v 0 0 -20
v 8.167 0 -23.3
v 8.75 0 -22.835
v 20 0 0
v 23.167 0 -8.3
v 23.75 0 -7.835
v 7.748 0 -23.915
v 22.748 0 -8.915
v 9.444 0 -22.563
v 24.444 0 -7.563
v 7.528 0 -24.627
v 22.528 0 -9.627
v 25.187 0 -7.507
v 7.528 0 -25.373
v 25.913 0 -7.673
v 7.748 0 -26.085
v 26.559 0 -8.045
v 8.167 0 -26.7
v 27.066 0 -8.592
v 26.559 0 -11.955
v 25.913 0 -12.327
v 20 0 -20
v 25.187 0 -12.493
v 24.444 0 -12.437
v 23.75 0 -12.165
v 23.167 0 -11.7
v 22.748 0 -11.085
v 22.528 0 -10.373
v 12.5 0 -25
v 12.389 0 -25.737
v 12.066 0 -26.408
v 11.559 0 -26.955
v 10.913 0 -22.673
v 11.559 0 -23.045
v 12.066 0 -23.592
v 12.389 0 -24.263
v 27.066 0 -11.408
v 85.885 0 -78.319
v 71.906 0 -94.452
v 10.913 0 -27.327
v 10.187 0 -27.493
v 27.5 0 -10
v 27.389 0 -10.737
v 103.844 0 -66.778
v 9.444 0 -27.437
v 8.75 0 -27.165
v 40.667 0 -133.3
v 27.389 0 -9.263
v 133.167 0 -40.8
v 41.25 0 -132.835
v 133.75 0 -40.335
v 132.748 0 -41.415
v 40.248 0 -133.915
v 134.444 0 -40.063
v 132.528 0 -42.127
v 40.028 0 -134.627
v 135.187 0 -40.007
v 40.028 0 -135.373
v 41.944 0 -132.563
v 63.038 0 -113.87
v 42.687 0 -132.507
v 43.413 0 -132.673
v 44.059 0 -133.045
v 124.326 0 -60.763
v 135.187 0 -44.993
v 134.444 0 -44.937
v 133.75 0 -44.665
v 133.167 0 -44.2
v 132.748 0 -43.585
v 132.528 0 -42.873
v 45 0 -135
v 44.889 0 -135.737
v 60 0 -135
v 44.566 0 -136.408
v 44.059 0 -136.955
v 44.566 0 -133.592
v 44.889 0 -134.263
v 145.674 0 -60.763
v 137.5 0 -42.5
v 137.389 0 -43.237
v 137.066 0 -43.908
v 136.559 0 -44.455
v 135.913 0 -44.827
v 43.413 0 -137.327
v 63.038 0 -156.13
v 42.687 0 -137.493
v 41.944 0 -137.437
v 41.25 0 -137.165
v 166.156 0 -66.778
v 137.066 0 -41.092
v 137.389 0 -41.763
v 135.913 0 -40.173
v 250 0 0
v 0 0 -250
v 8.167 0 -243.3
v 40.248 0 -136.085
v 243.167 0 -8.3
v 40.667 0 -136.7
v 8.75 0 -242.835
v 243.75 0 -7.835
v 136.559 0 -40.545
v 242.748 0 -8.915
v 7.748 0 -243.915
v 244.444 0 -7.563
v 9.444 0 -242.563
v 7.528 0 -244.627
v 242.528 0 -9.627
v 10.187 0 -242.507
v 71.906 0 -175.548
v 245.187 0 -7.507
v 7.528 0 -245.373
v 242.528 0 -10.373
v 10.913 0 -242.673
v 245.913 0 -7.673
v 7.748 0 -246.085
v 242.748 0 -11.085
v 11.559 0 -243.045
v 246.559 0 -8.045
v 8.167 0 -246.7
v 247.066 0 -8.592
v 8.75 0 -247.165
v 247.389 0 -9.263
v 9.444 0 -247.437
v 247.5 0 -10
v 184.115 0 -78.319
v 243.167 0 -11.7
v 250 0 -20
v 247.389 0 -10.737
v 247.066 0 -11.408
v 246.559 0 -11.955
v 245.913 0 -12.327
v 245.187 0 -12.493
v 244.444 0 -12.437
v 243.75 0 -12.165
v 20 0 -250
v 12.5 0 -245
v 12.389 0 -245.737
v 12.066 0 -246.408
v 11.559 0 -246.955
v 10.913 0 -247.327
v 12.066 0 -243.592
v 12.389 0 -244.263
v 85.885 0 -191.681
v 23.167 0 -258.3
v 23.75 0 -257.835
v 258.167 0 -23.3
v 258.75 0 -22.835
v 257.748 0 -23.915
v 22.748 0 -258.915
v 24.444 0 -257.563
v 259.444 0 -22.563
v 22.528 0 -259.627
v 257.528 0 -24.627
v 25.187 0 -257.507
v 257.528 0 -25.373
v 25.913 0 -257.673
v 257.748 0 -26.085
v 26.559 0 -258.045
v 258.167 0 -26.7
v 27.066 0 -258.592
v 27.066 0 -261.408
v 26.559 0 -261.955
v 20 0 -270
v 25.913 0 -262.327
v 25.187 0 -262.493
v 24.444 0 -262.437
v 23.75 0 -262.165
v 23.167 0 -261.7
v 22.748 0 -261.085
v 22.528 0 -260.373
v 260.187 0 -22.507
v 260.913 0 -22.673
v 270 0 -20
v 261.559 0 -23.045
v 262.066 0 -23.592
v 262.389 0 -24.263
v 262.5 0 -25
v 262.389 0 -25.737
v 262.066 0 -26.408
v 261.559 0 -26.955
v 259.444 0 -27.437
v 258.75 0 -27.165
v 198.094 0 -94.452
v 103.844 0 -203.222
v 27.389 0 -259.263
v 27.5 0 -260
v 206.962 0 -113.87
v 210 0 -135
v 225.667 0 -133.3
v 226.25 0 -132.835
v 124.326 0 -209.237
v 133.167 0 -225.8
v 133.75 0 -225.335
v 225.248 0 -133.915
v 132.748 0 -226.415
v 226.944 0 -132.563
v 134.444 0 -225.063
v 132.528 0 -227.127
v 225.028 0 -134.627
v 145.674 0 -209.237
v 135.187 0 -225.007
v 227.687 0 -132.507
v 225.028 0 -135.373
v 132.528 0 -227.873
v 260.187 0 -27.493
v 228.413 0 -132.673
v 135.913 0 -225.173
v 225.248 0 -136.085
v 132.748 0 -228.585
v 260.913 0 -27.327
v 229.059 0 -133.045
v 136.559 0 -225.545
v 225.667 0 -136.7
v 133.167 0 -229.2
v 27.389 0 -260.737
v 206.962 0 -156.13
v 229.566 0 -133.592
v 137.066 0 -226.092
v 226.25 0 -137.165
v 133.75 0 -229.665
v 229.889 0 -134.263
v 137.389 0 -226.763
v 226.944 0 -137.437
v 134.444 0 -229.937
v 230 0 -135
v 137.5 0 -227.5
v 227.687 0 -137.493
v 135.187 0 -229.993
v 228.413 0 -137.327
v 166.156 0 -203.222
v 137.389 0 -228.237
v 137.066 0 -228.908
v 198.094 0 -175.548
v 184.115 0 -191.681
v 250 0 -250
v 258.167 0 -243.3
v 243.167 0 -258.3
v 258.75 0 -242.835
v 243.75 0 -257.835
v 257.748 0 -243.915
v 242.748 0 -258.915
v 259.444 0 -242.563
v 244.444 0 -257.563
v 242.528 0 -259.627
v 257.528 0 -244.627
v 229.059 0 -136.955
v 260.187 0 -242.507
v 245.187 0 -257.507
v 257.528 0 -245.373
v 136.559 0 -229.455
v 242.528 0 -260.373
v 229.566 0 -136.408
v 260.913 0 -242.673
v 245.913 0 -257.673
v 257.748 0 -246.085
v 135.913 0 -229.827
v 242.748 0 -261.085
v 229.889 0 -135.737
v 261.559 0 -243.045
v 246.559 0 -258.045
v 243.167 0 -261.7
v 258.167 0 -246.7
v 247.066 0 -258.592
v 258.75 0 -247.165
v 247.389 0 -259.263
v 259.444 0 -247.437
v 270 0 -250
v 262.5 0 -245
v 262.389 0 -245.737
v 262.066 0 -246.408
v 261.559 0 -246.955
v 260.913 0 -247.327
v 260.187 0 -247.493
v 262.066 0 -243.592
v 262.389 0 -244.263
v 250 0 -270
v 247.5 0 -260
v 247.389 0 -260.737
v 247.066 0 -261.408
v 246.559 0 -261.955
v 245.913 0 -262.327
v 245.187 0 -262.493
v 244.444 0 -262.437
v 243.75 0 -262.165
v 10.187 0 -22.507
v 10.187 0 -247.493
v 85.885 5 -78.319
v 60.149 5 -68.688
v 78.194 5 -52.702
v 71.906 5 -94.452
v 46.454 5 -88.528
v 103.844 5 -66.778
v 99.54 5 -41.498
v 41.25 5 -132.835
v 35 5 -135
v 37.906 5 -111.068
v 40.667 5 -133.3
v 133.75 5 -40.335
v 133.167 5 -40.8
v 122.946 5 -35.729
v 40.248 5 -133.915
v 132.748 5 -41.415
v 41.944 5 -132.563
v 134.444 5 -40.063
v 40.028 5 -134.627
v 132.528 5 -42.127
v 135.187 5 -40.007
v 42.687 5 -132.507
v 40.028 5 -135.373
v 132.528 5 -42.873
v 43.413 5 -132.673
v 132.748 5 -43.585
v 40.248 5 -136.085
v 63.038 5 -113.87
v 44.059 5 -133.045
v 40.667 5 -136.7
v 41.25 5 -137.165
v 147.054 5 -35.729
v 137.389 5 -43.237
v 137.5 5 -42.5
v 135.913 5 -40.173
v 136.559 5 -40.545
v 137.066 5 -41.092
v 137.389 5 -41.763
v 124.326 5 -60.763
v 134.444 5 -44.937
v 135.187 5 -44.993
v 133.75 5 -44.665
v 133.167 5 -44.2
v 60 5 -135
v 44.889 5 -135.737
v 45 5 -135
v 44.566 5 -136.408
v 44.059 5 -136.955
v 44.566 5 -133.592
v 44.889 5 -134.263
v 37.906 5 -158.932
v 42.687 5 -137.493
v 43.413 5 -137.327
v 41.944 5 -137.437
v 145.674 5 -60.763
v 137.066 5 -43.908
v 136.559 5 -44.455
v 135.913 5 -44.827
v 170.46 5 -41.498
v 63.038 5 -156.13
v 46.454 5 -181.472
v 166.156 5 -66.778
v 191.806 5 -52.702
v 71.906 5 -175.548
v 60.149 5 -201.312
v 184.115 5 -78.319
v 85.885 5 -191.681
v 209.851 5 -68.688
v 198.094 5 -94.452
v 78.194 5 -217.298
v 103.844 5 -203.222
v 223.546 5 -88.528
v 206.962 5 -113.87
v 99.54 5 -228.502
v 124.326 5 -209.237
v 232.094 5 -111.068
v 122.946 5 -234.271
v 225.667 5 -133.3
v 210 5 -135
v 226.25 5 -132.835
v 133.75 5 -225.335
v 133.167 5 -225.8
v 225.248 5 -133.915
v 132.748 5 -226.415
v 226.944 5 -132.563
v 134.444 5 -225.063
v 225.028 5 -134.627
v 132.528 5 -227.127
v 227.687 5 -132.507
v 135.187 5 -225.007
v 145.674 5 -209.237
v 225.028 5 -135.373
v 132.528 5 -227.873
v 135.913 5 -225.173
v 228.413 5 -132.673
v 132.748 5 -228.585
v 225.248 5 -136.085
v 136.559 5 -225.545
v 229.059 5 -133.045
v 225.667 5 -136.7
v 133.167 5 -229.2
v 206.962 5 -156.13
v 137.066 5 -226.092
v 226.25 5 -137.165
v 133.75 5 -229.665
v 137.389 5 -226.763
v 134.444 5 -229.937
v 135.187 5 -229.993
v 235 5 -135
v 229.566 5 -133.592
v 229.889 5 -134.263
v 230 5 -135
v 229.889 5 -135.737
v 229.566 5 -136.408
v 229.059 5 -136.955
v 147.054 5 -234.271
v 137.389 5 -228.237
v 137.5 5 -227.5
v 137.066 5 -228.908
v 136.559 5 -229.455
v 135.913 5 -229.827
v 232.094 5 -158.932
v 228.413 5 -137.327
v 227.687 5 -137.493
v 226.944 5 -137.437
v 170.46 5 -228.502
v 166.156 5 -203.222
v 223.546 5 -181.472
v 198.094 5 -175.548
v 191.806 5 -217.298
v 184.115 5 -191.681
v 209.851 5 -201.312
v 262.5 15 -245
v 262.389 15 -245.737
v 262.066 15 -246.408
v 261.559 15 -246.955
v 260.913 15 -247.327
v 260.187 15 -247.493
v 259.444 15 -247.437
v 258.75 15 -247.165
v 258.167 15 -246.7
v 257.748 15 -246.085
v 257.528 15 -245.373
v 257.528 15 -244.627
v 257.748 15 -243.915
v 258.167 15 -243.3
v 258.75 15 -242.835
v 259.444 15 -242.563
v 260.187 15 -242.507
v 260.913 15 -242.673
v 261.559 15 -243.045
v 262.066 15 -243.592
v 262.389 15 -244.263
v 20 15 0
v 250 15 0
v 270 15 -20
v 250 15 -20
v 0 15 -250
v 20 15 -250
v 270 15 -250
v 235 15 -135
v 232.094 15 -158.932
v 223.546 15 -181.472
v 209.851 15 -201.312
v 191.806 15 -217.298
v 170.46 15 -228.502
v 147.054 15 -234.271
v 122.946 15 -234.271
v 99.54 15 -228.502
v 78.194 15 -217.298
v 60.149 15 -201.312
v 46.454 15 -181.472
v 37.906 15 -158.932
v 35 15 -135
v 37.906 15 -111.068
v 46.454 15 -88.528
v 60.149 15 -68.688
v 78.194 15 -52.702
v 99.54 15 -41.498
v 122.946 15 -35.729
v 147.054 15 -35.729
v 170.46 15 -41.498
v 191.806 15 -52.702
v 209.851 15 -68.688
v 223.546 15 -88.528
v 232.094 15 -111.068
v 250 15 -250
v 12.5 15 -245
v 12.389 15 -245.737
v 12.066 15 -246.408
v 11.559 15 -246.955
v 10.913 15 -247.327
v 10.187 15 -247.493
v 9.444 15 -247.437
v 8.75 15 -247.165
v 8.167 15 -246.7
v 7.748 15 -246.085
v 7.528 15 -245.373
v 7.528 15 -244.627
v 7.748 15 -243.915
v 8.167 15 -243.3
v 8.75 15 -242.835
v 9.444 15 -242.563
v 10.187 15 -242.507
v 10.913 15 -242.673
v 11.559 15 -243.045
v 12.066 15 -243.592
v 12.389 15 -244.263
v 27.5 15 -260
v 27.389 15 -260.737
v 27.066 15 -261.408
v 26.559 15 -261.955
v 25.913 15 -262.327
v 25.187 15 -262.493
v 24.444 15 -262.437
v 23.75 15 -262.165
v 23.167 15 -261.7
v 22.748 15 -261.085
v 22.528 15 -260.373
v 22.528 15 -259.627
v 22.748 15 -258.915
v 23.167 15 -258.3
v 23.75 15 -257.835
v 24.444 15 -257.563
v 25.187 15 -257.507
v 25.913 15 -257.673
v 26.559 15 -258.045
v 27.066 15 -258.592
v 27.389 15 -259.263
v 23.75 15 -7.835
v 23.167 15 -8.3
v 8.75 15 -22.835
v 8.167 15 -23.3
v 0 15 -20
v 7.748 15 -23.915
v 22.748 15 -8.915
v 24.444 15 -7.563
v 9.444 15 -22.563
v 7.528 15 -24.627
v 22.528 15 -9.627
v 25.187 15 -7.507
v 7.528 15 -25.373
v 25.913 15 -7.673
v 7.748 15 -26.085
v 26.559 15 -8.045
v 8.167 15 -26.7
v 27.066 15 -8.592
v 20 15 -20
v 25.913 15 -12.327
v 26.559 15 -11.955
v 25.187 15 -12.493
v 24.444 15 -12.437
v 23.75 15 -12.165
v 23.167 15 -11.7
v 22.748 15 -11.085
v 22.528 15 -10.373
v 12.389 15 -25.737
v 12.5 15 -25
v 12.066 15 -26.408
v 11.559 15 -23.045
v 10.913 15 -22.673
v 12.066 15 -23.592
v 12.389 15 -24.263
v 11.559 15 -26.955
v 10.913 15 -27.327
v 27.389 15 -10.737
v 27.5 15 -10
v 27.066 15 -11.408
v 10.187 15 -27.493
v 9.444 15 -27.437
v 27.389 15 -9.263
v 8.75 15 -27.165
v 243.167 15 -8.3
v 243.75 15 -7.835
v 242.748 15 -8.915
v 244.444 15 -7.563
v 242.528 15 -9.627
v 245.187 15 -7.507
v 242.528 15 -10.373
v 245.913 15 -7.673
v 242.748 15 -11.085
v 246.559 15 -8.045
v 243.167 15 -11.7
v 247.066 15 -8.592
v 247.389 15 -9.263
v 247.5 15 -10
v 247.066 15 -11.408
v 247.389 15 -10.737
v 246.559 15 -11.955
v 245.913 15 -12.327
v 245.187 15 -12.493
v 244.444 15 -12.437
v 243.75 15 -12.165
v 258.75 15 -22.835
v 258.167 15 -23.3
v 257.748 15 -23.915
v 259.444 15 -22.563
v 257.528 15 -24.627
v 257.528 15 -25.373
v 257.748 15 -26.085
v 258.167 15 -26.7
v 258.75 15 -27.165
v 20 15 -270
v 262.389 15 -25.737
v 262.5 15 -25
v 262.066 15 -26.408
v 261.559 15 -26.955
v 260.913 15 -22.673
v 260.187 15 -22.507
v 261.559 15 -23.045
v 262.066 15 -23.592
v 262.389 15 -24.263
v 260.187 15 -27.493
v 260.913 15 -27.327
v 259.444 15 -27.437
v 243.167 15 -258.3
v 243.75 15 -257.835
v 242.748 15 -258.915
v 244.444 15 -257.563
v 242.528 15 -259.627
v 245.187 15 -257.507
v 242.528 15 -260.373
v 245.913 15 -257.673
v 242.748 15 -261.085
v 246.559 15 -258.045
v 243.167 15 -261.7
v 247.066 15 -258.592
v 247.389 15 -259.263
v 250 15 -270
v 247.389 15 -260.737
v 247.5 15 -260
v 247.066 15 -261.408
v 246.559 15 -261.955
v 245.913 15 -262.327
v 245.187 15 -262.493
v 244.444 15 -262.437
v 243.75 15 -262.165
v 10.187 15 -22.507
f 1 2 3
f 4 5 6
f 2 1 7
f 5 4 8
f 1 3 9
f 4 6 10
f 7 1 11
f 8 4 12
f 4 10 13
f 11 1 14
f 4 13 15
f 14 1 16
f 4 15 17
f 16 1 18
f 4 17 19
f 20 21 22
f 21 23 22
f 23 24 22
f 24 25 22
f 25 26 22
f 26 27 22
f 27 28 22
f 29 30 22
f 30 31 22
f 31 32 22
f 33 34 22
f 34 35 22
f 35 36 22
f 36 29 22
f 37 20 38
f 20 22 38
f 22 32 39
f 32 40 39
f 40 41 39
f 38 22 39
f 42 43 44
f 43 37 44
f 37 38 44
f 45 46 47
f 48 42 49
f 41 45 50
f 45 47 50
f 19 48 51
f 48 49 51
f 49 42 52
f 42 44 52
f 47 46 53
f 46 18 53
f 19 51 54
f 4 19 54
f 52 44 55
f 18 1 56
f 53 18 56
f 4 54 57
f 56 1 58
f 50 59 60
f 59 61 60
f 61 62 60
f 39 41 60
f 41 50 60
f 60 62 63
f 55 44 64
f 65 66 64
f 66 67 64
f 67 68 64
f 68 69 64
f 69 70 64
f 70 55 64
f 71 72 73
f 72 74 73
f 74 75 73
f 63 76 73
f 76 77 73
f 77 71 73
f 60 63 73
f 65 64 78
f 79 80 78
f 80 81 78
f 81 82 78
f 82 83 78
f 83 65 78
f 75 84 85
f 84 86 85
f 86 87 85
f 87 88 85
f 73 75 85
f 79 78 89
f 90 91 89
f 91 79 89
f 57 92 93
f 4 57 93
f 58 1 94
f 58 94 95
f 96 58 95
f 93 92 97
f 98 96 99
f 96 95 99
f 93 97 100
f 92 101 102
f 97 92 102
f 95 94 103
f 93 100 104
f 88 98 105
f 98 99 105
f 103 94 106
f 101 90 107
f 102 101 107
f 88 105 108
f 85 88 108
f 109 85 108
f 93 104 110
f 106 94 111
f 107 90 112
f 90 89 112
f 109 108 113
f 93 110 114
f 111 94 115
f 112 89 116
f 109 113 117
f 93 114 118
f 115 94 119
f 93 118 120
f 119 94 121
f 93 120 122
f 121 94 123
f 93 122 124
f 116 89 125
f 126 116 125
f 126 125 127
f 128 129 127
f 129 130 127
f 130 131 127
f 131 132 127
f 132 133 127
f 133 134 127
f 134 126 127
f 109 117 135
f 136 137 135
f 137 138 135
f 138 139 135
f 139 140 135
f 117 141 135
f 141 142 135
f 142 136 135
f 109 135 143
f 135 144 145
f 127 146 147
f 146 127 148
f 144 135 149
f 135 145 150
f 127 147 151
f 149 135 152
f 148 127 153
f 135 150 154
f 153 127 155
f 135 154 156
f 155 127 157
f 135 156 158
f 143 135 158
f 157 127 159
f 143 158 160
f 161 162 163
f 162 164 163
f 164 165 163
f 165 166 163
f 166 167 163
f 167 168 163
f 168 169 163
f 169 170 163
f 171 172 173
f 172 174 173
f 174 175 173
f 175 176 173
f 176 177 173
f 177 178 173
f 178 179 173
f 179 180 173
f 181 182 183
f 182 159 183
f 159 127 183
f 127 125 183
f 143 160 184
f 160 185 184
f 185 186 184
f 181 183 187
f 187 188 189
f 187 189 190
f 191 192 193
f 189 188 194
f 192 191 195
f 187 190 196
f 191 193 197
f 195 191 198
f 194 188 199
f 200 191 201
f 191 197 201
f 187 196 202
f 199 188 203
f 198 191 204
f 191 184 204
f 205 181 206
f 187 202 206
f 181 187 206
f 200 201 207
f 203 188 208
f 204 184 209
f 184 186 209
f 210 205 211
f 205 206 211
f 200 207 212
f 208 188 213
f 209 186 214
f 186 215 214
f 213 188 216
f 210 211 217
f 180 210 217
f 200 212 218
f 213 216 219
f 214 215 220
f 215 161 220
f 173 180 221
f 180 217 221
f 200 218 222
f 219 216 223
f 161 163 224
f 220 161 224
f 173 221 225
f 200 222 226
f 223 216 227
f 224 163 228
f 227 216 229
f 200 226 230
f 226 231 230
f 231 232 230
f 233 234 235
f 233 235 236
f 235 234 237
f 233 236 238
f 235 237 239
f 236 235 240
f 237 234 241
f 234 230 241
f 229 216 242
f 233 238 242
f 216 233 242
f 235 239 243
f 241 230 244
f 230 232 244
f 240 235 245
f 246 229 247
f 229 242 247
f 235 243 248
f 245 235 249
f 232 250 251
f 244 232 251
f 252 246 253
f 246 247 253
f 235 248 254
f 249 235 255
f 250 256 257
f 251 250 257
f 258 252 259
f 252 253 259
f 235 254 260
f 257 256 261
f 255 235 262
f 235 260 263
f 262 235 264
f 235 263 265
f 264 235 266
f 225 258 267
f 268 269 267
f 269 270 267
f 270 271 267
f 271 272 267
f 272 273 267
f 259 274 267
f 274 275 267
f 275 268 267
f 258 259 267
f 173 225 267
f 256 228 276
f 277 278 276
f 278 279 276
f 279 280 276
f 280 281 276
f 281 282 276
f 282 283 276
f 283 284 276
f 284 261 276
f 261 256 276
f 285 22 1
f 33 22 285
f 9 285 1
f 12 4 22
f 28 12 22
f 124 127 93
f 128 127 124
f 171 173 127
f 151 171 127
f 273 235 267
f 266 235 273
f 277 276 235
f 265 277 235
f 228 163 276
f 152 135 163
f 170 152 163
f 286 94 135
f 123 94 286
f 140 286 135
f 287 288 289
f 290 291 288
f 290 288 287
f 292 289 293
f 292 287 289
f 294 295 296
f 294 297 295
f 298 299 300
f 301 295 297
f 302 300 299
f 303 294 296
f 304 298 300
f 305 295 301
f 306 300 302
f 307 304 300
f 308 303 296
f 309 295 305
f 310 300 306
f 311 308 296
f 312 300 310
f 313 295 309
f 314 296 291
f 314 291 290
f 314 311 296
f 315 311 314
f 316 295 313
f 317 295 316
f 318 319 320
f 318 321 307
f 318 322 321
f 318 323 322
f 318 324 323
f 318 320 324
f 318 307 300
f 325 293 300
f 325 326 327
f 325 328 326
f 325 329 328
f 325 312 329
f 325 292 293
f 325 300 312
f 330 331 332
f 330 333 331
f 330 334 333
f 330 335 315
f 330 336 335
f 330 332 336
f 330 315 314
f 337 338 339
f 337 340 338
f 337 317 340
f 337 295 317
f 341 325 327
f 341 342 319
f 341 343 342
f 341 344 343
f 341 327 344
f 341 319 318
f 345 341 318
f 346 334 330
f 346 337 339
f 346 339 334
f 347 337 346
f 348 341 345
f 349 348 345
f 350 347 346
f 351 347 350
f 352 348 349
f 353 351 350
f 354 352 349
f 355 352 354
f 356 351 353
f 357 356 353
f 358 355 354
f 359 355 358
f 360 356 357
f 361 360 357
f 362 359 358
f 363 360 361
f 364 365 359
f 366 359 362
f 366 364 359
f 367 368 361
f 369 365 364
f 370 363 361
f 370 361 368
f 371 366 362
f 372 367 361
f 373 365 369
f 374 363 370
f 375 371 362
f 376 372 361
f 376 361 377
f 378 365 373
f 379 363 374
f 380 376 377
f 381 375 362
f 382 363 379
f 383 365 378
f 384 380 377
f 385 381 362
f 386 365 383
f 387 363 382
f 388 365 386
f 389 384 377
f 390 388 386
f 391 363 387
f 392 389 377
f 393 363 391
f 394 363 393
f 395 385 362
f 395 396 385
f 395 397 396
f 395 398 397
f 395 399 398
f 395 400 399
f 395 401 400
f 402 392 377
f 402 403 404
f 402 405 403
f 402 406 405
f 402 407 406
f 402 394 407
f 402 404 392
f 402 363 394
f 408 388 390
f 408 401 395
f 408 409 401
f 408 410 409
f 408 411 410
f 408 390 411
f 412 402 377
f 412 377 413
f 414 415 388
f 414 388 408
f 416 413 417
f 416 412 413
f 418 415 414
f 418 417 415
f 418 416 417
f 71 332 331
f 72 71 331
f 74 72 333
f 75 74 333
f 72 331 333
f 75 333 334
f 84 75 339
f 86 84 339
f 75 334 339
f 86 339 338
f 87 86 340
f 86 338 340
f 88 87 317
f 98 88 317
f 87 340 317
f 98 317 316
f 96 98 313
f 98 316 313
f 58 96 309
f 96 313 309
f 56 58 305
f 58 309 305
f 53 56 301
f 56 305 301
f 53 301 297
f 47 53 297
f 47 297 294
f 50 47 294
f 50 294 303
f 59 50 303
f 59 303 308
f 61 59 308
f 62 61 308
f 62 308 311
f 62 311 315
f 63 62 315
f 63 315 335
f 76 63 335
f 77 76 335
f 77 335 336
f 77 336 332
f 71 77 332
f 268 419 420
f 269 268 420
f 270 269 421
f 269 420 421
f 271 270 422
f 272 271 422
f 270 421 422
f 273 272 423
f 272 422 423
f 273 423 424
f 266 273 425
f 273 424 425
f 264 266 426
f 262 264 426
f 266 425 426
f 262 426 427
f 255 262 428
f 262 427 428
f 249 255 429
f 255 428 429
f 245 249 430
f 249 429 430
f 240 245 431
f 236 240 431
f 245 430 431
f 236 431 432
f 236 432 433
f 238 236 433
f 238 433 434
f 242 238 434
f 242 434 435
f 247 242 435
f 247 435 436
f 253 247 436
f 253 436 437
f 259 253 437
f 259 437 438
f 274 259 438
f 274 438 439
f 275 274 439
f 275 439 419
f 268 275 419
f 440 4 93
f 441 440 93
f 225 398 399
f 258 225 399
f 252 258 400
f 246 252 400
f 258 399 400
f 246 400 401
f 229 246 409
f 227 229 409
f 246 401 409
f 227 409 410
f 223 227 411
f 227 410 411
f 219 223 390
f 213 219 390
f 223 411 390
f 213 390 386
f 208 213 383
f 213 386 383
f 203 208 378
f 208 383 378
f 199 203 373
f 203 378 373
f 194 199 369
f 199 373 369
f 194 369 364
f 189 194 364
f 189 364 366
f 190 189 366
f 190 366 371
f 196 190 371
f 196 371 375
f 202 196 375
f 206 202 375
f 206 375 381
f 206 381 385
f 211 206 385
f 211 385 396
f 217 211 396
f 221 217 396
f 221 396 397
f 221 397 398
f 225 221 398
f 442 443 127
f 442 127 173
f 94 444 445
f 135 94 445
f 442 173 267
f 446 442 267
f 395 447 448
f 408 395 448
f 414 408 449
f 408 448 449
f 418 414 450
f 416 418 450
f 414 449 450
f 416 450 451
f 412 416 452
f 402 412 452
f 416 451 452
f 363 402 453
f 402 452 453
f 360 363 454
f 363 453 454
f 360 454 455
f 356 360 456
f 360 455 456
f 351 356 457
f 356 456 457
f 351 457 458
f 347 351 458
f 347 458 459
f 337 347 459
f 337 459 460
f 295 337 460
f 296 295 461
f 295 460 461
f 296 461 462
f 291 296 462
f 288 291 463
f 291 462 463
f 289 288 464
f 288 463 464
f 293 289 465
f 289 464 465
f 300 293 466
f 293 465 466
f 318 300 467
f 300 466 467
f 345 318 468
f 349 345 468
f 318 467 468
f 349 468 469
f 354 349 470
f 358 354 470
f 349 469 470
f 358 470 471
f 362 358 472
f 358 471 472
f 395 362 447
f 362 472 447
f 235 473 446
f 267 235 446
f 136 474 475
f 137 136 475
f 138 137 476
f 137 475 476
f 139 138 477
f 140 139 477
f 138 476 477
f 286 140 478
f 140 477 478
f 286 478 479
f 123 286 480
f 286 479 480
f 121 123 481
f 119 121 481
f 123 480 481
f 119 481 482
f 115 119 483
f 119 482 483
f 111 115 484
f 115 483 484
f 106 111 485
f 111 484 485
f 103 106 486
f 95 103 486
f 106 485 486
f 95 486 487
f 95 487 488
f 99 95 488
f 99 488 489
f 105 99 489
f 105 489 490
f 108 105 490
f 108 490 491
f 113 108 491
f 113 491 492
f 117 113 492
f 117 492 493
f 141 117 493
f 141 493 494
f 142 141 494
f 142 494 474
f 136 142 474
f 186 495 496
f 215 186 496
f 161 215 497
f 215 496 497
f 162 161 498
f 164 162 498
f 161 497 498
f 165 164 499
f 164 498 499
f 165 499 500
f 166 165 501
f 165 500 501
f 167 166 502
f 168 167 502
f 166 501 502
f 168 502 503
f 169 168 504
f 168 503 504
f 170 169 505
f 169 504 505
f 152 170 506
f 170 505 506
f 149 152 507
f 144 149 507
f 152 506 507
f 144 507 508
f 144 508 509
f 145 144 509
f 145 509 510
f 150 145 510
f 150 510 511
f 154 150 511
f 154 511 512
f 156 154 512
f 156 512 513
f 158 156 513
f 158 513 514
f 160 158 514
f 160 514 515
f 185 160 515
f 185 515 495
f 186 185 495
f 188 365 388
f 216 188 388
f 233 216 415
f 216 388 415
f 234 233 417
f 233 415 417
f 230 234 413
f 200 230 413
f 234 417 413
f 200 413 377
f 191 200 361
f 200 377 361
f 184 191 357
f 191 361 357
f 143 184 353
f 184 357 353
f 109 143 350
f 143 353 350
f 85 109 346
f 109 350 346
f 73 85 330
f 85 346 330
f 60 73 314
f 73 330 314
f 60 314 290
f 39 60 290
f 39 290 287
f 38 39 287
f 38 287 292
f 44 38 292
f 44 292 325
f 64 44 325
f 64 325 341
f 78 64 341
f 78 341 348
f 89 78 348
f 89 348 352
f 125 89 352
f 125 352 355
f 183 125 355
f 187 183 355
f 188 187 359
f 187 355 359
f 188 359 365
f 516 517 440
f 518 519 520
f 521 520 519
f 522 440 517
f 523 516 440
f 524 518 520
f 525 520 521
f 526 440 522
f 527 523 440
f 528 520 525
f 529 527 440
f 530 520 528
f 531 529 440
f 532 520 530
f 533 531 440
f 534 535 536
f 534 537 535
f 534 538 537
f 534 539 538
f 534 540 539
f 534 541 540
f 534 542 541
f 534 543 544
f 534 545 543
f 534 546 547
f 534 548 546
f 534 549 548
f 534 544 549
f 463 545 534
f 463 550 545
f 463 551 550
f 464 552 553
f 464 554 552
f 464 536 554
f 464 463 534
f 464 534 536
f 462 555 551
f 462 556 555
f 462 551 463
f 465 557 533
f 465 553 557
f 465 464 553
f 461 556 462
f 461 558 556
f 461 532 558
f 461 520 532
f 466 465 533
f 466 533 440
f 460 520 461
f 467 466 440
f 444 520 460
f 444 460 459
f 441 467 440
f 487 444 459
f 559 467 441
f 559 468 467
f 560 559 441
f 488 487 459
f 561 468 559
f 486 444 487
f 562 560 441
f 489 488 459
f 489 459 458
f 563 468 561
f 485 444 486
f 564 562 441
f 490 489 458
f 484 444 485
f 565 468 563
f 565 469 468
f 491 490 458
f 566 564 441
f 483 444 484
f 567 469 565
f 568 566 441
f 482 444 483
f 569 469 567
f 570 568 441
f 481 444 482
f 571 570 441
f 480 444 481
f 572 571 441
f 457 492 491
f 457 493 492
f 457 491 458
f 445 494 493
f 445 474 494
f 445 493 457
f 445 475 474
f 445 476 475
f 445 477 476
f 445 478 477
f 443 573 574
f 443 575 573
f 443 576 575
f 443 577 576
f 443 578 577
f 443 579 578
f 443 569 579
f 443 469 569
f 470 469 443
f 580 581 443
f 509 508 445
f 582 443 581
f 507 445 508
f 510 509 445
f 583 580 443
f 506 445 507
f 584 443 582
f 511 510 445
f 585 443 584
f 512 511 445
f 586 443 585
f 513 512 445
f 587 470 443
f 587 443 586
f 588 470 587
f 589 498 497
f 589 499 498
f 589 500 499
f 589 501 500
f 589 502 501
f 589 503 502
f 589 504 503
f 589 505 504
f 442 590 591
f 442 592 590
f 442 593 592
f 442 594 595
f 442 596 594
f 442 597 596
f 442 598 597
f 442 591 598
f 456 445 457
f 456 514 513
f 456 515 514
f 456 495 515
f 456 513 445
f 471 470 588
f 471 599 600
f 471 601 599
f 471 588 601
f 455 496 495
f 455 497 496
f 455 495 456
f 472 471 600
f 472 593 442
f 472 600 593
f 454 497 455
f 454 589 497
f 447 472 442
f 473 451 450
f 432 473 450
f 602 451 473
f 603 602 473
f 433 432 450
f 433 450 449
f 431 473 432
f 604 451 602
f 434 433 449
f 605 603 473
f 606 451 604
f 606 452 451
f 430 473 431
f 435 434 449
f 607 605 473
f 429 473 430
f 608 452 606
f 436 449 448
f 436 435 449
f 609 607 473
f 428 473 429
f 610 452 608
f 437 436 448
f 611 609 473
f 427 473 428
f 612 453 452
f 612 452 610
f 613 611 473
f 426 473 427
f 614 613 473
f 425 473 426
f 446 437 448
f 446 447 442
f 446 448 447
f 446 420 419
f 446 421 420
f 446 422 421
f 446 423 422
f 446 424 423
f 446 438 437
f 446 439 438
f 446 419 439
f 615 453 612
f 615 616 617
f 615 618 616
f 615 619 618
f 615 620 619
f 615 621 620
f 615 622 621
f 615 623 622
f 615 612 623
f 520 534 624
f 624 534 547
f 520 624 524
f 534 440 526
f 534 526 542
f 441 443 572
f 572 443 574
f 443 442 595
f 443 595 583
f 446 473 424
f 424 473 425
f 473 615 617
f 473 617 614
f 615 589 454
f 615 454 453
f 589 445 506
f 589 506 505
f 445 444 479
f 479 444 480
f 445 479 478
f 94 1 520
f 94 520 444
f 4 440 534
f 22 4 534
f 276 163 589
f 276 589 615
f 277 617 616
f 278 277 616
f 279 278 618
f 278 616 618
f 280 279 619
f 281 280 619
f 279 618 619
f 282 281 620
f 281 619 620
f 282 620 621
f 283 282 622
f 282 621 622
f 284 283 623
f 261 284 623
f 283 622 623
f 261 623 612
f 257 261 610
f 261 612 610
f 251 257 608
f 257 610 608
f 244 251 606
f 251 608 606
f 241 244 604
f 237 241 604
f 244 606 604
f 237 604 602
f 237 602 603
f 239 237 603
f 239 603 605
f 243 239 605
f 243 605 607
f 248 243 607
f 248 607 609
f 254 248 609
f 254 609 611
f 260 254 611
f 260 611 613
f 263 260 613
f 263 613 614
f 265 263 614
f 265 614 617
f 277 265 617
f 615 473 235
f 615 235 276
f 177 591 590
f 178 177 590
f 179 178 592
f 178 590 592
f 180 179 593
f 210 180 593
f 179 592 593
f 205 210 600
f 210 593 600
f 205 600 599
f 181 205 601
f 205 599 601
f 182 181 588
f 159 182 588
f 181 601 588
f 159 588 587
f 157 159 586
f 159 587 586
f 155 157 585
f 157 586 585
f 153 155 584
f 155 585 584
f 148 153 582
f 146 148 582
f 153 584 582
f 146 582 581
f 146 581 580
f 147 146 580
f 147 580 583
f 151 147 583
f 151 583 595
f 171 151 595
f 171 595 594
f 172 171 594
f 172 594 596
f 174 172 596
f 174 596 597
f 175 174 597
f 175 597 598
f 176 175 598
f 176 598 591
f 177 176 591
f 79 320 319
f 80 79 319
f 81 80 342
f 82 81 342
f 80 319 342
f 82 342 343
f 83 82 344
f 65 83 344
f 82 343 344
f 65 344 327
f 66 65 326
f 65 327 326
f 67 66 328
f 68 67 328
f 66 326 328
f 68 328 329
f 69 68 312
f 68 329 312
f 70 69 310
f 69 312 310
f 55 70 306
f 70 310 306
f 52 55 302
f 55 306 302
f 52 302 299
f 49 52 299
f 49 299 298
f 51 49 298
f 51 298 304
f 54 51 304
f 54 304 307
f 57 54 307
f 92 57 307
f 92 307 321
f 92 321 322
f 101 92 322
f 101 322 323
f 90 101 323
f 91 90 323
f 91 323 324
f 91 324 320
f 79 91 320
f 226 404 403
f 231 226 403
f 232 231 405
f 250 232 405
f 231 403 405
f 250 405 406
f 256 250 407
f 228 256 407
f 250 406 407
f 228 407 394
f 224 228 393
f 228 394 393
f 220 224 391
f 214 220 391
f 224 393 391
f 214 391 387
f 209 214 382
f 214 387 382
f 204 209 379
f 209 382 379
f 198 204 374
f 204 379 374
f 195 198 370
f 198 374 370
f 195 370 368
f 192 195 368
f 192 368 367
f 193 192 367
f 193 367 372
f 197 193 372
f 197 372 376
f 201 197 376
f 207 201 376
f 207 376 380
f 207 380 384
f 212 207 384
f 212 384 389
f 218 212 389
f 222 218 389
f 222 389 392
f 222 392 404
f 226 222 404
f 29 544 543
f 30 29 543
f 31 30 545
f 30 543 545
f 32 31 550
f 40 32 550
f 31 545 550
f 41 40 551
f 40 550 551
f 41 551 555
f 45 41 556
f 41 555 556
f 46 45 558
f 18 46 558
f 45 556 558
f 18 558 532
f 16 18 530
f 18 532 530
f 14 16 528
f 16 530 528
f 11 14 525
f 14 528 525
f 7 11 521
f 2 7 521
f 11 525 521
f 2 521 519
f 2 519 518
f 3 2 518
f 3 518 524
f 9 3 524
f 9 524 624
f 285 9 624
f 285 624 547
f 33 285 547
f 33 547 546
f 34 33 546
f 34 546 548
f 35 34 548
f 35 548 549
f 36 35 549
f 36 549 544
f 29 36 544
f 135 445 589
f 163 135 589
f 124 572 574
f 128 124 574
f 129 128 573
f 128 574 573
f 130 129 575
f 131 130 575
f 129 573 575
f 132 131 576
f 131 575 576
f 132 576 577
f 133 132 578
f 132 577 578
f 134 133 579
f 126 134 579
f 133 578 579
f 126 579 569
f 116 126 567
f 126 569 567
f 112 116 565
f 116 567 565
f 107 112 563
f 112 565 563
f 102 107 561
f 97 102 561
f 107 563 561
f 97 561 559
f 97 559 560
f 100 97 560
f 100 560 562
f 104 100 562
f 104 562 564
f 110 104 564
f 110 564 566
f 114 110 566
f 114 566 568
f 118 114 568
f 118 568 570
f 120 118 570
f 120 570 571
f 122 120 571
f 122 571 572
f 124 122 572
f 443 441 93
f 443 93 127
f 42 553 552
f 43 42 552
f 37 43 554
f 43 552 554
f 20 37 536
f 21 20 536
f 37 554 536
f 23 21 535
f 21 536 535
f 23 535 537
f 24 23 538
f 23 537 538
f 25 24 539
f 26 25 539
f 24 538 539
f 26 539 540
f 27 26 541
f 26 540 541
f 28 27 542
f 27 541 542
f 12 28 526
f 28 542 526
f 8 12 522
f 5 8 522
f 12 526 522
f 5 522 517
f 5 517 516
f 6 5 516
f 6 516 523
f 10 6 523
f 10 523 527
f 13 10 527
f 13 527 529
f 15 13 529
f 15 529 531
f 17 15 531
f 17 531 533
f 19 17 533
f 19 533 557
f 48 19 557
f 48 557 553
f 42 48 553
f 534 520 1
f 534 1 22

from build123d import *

# Parameters (mm, degrees)
SKETCH1_W           = 270
SKETCH1_H           = 270
BOSS_EXTRUDE1_DEPTH = 15
SKETCH8_W           = 20
SKETCH8_H           = 20
CUT_EXTRUDE1_DEPTH  = 16
SKETCH9_R           = 2.5
CUT_EXTRUDE2_DEPTH  = 16
SKETCH10_R          = 100
CUT_EXTRUDE3_DEPTH  = 10
SKETCH12_R          = 75
SKETCH12_R_2        = 2.5
CUT_EXTRUDE4_DEPTH  = 6


with BuildPart() as part:
    # Sketch1 → Boss-Extrude1 (new body)
    with BuildSketch(Plane(origin=(0, 0, 0), x_dir=(1, 0, 0), z_dir=(0, 1, 0))):
        with Locations((135, 135)):
            Rectangle(SKETCH1_W, SKETCH1_H)
    extrude(amount=BOSS_EXTRUDE1_DEPTH)

    # Sketch8 → Cut-Extrude1 (cut, through all)
    with BuildSketch(Plane(origin=(0, 15, 0), x_dir=(1, 0, 0), z_dir=(0, 1, 0))):
        with Locations((10, 260)):
            Rectangle(SKETCH8_W, SKETCH8_H)
        with Locations((260, 260)):
            Rectangle(SKETCH8_W, SKETCH8_H)
        with Locations((260, 10)):
            Rectangle(SKETCH8_W, SKETCH8_H)
        with Locations((10, 10)):
            Rectangle(SKETCH8_W, SKETCH8_H)
    extrude(amount=-CUT_EXTRUDE1_DEPTH, mode=Mode.SUBTRACT)

    # Sketch9 → Cut-Extrude2 (cut, through all)
    with BuildSketch(Plane(origin=(0, 15, 0), x_dir=(1, 0, 0), z_dir=(0, 1, 0))):
        with Locations((10, 245)):
            Circle(SKETCH9_R)
        with Locations((10, 25)):
            Circle(SKETCH9_R)
        with Locations((25, 10)):
            Circle(SKETCH9_R)
        with Locations((245, 10)):
            Circle(SKETCH9_R)
        with Locations((260, 25)):
            Circle(SKETCH9_R)
        with Locations((260, 245)):
            Circle(SKETCH9_R)
        with Locations((245, 260)):
            Circle(SKETCH9_R)
        with Locations((25, 260)):
            Circle(SKETCH9_R)
    extrude(amount=-CUT_EXTRUDE2_DEPTH, mode=Mode.SUBTRACT)

    # Sketch10 → Cut-Extrude3 (cut)
    with BuildSketch(Plane(origin=(0, 15, 0), x_dir=(1, 0, 0), z_dir=(0, 1, 0))):
        with Locations((135, 135)):
            Circle(SKETCH10_R)
    extrude(amount=-CUT_EXTRUDE3_DEPTH, mode=Mode.SUBTRACT)

    # Sketch12 → Cut-Extrude4 (cut, through all)
    with BuildSketch(Plane(origin=(0, 5, 0), x_dir=(1, 0, 0), z_dir=(0, 1, 0))):
        with Locations((135, 135)):
            Circle(SKETCH12_R)
        with Locations((135, 227.5)):
            Circle(SKETCH12_R_2)
        with Locations((227.5, 135)):
            Circle(SKETCH12_R_2)
        with Locations((135, 42.5)):
            Circle(SKETCH12_R_2)
        with Locations((42.5, 135)):
            Circle(SKETCH12_R_2)
    extrude(amount=-CUT_EXTRUDE4_DEPTH, mode=Mode.SUBTRACT)


solid = part.part
